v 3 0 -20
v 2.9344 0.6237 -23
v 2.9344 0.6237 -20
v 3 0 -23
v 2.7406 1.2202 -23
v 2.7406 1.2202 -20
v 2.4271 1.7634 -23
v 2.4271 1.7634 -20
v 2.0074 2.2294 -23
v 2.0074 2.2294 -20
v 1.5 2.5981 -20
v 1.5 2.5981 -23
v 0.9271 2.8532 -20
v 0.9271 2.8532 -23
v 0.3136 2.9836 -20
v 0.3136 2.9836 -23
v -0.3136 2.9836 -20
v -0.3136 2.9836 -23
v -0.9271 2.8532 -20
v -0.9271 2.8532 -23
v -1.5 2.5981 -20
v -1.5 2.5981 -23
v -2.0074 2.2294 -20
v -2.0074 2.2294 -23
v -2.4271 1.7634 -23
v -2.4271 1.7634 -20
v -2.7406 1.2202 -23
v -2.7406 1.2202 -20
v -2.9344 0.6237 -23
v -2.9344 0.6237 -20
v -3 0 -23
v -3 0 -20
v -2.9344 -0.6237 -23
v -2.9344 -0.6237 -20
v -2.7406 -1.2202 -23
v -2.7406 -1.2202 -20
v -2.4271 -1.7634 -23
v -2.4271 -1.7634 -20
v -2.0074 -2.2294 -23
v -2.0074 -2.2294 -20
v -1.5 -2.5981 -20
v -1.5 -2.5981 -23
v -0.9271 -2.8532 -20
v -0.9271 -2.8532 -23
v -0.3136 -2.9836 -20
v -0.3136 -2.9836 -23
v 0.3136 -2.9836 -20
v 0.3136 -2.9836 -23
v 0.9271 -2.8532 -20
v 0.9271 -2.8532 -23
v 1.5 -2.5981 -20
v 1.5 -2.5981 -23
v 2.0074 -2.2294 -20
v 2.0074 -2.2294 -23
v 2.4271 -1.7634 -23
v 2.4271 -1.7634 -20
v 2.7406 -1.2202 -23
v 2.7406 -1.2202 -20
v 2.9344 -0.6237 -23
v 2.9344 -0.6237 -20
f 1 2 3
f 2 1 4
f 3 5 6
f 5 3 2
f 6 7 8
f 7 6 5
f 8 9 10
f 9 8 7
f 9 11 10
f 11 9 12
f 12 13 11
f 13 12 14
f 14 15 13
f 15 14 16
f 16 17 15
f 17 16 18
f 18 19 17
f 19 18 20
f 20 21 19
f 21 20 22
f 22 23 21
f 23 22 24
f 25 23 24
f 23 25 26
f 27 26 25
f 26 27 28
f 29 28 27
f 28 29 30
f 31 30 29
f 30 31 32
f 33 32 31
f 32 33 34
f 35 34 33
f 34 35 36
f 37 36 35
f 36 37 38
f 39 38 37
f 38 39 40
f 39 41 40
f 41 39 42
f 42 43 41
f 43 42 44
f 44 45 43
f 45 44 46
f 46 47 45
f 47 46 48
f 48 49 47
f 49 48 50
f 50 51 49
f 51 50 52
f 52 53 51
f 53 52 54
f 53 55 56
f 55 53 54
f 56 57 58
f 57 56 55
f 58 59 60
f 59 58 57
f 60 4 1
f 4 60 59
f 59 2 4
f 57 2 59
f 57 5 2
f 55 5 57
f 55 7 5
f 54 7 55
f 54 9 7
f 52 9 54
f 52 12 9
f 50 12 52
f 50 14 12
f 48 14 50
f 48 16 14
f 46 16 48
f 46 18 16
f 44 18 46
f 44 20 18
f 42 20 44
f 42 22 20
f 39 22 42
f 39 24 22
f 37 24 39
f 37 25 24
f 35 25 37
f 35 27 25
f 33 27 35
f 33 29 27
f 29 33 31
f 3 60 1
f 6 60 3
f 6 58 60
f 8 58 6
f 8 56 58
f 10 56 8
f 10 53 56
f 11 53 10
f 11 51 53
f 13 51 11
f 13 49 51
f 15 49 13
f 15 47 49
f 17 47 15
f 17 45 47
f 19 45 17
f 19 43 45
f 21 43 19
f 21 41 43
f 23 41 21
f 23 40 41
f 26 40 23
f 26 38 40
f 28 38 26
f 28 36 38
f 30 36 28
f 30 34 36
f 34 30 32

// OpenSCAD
spheresize = 20;
footH = 3;
footR = 3;

%sphere(spheresize , $fn = 40);
translate([0, 0, -spheresize- footH]){
	cylinder(r = footR, h = footH, $fn = 30);
}
